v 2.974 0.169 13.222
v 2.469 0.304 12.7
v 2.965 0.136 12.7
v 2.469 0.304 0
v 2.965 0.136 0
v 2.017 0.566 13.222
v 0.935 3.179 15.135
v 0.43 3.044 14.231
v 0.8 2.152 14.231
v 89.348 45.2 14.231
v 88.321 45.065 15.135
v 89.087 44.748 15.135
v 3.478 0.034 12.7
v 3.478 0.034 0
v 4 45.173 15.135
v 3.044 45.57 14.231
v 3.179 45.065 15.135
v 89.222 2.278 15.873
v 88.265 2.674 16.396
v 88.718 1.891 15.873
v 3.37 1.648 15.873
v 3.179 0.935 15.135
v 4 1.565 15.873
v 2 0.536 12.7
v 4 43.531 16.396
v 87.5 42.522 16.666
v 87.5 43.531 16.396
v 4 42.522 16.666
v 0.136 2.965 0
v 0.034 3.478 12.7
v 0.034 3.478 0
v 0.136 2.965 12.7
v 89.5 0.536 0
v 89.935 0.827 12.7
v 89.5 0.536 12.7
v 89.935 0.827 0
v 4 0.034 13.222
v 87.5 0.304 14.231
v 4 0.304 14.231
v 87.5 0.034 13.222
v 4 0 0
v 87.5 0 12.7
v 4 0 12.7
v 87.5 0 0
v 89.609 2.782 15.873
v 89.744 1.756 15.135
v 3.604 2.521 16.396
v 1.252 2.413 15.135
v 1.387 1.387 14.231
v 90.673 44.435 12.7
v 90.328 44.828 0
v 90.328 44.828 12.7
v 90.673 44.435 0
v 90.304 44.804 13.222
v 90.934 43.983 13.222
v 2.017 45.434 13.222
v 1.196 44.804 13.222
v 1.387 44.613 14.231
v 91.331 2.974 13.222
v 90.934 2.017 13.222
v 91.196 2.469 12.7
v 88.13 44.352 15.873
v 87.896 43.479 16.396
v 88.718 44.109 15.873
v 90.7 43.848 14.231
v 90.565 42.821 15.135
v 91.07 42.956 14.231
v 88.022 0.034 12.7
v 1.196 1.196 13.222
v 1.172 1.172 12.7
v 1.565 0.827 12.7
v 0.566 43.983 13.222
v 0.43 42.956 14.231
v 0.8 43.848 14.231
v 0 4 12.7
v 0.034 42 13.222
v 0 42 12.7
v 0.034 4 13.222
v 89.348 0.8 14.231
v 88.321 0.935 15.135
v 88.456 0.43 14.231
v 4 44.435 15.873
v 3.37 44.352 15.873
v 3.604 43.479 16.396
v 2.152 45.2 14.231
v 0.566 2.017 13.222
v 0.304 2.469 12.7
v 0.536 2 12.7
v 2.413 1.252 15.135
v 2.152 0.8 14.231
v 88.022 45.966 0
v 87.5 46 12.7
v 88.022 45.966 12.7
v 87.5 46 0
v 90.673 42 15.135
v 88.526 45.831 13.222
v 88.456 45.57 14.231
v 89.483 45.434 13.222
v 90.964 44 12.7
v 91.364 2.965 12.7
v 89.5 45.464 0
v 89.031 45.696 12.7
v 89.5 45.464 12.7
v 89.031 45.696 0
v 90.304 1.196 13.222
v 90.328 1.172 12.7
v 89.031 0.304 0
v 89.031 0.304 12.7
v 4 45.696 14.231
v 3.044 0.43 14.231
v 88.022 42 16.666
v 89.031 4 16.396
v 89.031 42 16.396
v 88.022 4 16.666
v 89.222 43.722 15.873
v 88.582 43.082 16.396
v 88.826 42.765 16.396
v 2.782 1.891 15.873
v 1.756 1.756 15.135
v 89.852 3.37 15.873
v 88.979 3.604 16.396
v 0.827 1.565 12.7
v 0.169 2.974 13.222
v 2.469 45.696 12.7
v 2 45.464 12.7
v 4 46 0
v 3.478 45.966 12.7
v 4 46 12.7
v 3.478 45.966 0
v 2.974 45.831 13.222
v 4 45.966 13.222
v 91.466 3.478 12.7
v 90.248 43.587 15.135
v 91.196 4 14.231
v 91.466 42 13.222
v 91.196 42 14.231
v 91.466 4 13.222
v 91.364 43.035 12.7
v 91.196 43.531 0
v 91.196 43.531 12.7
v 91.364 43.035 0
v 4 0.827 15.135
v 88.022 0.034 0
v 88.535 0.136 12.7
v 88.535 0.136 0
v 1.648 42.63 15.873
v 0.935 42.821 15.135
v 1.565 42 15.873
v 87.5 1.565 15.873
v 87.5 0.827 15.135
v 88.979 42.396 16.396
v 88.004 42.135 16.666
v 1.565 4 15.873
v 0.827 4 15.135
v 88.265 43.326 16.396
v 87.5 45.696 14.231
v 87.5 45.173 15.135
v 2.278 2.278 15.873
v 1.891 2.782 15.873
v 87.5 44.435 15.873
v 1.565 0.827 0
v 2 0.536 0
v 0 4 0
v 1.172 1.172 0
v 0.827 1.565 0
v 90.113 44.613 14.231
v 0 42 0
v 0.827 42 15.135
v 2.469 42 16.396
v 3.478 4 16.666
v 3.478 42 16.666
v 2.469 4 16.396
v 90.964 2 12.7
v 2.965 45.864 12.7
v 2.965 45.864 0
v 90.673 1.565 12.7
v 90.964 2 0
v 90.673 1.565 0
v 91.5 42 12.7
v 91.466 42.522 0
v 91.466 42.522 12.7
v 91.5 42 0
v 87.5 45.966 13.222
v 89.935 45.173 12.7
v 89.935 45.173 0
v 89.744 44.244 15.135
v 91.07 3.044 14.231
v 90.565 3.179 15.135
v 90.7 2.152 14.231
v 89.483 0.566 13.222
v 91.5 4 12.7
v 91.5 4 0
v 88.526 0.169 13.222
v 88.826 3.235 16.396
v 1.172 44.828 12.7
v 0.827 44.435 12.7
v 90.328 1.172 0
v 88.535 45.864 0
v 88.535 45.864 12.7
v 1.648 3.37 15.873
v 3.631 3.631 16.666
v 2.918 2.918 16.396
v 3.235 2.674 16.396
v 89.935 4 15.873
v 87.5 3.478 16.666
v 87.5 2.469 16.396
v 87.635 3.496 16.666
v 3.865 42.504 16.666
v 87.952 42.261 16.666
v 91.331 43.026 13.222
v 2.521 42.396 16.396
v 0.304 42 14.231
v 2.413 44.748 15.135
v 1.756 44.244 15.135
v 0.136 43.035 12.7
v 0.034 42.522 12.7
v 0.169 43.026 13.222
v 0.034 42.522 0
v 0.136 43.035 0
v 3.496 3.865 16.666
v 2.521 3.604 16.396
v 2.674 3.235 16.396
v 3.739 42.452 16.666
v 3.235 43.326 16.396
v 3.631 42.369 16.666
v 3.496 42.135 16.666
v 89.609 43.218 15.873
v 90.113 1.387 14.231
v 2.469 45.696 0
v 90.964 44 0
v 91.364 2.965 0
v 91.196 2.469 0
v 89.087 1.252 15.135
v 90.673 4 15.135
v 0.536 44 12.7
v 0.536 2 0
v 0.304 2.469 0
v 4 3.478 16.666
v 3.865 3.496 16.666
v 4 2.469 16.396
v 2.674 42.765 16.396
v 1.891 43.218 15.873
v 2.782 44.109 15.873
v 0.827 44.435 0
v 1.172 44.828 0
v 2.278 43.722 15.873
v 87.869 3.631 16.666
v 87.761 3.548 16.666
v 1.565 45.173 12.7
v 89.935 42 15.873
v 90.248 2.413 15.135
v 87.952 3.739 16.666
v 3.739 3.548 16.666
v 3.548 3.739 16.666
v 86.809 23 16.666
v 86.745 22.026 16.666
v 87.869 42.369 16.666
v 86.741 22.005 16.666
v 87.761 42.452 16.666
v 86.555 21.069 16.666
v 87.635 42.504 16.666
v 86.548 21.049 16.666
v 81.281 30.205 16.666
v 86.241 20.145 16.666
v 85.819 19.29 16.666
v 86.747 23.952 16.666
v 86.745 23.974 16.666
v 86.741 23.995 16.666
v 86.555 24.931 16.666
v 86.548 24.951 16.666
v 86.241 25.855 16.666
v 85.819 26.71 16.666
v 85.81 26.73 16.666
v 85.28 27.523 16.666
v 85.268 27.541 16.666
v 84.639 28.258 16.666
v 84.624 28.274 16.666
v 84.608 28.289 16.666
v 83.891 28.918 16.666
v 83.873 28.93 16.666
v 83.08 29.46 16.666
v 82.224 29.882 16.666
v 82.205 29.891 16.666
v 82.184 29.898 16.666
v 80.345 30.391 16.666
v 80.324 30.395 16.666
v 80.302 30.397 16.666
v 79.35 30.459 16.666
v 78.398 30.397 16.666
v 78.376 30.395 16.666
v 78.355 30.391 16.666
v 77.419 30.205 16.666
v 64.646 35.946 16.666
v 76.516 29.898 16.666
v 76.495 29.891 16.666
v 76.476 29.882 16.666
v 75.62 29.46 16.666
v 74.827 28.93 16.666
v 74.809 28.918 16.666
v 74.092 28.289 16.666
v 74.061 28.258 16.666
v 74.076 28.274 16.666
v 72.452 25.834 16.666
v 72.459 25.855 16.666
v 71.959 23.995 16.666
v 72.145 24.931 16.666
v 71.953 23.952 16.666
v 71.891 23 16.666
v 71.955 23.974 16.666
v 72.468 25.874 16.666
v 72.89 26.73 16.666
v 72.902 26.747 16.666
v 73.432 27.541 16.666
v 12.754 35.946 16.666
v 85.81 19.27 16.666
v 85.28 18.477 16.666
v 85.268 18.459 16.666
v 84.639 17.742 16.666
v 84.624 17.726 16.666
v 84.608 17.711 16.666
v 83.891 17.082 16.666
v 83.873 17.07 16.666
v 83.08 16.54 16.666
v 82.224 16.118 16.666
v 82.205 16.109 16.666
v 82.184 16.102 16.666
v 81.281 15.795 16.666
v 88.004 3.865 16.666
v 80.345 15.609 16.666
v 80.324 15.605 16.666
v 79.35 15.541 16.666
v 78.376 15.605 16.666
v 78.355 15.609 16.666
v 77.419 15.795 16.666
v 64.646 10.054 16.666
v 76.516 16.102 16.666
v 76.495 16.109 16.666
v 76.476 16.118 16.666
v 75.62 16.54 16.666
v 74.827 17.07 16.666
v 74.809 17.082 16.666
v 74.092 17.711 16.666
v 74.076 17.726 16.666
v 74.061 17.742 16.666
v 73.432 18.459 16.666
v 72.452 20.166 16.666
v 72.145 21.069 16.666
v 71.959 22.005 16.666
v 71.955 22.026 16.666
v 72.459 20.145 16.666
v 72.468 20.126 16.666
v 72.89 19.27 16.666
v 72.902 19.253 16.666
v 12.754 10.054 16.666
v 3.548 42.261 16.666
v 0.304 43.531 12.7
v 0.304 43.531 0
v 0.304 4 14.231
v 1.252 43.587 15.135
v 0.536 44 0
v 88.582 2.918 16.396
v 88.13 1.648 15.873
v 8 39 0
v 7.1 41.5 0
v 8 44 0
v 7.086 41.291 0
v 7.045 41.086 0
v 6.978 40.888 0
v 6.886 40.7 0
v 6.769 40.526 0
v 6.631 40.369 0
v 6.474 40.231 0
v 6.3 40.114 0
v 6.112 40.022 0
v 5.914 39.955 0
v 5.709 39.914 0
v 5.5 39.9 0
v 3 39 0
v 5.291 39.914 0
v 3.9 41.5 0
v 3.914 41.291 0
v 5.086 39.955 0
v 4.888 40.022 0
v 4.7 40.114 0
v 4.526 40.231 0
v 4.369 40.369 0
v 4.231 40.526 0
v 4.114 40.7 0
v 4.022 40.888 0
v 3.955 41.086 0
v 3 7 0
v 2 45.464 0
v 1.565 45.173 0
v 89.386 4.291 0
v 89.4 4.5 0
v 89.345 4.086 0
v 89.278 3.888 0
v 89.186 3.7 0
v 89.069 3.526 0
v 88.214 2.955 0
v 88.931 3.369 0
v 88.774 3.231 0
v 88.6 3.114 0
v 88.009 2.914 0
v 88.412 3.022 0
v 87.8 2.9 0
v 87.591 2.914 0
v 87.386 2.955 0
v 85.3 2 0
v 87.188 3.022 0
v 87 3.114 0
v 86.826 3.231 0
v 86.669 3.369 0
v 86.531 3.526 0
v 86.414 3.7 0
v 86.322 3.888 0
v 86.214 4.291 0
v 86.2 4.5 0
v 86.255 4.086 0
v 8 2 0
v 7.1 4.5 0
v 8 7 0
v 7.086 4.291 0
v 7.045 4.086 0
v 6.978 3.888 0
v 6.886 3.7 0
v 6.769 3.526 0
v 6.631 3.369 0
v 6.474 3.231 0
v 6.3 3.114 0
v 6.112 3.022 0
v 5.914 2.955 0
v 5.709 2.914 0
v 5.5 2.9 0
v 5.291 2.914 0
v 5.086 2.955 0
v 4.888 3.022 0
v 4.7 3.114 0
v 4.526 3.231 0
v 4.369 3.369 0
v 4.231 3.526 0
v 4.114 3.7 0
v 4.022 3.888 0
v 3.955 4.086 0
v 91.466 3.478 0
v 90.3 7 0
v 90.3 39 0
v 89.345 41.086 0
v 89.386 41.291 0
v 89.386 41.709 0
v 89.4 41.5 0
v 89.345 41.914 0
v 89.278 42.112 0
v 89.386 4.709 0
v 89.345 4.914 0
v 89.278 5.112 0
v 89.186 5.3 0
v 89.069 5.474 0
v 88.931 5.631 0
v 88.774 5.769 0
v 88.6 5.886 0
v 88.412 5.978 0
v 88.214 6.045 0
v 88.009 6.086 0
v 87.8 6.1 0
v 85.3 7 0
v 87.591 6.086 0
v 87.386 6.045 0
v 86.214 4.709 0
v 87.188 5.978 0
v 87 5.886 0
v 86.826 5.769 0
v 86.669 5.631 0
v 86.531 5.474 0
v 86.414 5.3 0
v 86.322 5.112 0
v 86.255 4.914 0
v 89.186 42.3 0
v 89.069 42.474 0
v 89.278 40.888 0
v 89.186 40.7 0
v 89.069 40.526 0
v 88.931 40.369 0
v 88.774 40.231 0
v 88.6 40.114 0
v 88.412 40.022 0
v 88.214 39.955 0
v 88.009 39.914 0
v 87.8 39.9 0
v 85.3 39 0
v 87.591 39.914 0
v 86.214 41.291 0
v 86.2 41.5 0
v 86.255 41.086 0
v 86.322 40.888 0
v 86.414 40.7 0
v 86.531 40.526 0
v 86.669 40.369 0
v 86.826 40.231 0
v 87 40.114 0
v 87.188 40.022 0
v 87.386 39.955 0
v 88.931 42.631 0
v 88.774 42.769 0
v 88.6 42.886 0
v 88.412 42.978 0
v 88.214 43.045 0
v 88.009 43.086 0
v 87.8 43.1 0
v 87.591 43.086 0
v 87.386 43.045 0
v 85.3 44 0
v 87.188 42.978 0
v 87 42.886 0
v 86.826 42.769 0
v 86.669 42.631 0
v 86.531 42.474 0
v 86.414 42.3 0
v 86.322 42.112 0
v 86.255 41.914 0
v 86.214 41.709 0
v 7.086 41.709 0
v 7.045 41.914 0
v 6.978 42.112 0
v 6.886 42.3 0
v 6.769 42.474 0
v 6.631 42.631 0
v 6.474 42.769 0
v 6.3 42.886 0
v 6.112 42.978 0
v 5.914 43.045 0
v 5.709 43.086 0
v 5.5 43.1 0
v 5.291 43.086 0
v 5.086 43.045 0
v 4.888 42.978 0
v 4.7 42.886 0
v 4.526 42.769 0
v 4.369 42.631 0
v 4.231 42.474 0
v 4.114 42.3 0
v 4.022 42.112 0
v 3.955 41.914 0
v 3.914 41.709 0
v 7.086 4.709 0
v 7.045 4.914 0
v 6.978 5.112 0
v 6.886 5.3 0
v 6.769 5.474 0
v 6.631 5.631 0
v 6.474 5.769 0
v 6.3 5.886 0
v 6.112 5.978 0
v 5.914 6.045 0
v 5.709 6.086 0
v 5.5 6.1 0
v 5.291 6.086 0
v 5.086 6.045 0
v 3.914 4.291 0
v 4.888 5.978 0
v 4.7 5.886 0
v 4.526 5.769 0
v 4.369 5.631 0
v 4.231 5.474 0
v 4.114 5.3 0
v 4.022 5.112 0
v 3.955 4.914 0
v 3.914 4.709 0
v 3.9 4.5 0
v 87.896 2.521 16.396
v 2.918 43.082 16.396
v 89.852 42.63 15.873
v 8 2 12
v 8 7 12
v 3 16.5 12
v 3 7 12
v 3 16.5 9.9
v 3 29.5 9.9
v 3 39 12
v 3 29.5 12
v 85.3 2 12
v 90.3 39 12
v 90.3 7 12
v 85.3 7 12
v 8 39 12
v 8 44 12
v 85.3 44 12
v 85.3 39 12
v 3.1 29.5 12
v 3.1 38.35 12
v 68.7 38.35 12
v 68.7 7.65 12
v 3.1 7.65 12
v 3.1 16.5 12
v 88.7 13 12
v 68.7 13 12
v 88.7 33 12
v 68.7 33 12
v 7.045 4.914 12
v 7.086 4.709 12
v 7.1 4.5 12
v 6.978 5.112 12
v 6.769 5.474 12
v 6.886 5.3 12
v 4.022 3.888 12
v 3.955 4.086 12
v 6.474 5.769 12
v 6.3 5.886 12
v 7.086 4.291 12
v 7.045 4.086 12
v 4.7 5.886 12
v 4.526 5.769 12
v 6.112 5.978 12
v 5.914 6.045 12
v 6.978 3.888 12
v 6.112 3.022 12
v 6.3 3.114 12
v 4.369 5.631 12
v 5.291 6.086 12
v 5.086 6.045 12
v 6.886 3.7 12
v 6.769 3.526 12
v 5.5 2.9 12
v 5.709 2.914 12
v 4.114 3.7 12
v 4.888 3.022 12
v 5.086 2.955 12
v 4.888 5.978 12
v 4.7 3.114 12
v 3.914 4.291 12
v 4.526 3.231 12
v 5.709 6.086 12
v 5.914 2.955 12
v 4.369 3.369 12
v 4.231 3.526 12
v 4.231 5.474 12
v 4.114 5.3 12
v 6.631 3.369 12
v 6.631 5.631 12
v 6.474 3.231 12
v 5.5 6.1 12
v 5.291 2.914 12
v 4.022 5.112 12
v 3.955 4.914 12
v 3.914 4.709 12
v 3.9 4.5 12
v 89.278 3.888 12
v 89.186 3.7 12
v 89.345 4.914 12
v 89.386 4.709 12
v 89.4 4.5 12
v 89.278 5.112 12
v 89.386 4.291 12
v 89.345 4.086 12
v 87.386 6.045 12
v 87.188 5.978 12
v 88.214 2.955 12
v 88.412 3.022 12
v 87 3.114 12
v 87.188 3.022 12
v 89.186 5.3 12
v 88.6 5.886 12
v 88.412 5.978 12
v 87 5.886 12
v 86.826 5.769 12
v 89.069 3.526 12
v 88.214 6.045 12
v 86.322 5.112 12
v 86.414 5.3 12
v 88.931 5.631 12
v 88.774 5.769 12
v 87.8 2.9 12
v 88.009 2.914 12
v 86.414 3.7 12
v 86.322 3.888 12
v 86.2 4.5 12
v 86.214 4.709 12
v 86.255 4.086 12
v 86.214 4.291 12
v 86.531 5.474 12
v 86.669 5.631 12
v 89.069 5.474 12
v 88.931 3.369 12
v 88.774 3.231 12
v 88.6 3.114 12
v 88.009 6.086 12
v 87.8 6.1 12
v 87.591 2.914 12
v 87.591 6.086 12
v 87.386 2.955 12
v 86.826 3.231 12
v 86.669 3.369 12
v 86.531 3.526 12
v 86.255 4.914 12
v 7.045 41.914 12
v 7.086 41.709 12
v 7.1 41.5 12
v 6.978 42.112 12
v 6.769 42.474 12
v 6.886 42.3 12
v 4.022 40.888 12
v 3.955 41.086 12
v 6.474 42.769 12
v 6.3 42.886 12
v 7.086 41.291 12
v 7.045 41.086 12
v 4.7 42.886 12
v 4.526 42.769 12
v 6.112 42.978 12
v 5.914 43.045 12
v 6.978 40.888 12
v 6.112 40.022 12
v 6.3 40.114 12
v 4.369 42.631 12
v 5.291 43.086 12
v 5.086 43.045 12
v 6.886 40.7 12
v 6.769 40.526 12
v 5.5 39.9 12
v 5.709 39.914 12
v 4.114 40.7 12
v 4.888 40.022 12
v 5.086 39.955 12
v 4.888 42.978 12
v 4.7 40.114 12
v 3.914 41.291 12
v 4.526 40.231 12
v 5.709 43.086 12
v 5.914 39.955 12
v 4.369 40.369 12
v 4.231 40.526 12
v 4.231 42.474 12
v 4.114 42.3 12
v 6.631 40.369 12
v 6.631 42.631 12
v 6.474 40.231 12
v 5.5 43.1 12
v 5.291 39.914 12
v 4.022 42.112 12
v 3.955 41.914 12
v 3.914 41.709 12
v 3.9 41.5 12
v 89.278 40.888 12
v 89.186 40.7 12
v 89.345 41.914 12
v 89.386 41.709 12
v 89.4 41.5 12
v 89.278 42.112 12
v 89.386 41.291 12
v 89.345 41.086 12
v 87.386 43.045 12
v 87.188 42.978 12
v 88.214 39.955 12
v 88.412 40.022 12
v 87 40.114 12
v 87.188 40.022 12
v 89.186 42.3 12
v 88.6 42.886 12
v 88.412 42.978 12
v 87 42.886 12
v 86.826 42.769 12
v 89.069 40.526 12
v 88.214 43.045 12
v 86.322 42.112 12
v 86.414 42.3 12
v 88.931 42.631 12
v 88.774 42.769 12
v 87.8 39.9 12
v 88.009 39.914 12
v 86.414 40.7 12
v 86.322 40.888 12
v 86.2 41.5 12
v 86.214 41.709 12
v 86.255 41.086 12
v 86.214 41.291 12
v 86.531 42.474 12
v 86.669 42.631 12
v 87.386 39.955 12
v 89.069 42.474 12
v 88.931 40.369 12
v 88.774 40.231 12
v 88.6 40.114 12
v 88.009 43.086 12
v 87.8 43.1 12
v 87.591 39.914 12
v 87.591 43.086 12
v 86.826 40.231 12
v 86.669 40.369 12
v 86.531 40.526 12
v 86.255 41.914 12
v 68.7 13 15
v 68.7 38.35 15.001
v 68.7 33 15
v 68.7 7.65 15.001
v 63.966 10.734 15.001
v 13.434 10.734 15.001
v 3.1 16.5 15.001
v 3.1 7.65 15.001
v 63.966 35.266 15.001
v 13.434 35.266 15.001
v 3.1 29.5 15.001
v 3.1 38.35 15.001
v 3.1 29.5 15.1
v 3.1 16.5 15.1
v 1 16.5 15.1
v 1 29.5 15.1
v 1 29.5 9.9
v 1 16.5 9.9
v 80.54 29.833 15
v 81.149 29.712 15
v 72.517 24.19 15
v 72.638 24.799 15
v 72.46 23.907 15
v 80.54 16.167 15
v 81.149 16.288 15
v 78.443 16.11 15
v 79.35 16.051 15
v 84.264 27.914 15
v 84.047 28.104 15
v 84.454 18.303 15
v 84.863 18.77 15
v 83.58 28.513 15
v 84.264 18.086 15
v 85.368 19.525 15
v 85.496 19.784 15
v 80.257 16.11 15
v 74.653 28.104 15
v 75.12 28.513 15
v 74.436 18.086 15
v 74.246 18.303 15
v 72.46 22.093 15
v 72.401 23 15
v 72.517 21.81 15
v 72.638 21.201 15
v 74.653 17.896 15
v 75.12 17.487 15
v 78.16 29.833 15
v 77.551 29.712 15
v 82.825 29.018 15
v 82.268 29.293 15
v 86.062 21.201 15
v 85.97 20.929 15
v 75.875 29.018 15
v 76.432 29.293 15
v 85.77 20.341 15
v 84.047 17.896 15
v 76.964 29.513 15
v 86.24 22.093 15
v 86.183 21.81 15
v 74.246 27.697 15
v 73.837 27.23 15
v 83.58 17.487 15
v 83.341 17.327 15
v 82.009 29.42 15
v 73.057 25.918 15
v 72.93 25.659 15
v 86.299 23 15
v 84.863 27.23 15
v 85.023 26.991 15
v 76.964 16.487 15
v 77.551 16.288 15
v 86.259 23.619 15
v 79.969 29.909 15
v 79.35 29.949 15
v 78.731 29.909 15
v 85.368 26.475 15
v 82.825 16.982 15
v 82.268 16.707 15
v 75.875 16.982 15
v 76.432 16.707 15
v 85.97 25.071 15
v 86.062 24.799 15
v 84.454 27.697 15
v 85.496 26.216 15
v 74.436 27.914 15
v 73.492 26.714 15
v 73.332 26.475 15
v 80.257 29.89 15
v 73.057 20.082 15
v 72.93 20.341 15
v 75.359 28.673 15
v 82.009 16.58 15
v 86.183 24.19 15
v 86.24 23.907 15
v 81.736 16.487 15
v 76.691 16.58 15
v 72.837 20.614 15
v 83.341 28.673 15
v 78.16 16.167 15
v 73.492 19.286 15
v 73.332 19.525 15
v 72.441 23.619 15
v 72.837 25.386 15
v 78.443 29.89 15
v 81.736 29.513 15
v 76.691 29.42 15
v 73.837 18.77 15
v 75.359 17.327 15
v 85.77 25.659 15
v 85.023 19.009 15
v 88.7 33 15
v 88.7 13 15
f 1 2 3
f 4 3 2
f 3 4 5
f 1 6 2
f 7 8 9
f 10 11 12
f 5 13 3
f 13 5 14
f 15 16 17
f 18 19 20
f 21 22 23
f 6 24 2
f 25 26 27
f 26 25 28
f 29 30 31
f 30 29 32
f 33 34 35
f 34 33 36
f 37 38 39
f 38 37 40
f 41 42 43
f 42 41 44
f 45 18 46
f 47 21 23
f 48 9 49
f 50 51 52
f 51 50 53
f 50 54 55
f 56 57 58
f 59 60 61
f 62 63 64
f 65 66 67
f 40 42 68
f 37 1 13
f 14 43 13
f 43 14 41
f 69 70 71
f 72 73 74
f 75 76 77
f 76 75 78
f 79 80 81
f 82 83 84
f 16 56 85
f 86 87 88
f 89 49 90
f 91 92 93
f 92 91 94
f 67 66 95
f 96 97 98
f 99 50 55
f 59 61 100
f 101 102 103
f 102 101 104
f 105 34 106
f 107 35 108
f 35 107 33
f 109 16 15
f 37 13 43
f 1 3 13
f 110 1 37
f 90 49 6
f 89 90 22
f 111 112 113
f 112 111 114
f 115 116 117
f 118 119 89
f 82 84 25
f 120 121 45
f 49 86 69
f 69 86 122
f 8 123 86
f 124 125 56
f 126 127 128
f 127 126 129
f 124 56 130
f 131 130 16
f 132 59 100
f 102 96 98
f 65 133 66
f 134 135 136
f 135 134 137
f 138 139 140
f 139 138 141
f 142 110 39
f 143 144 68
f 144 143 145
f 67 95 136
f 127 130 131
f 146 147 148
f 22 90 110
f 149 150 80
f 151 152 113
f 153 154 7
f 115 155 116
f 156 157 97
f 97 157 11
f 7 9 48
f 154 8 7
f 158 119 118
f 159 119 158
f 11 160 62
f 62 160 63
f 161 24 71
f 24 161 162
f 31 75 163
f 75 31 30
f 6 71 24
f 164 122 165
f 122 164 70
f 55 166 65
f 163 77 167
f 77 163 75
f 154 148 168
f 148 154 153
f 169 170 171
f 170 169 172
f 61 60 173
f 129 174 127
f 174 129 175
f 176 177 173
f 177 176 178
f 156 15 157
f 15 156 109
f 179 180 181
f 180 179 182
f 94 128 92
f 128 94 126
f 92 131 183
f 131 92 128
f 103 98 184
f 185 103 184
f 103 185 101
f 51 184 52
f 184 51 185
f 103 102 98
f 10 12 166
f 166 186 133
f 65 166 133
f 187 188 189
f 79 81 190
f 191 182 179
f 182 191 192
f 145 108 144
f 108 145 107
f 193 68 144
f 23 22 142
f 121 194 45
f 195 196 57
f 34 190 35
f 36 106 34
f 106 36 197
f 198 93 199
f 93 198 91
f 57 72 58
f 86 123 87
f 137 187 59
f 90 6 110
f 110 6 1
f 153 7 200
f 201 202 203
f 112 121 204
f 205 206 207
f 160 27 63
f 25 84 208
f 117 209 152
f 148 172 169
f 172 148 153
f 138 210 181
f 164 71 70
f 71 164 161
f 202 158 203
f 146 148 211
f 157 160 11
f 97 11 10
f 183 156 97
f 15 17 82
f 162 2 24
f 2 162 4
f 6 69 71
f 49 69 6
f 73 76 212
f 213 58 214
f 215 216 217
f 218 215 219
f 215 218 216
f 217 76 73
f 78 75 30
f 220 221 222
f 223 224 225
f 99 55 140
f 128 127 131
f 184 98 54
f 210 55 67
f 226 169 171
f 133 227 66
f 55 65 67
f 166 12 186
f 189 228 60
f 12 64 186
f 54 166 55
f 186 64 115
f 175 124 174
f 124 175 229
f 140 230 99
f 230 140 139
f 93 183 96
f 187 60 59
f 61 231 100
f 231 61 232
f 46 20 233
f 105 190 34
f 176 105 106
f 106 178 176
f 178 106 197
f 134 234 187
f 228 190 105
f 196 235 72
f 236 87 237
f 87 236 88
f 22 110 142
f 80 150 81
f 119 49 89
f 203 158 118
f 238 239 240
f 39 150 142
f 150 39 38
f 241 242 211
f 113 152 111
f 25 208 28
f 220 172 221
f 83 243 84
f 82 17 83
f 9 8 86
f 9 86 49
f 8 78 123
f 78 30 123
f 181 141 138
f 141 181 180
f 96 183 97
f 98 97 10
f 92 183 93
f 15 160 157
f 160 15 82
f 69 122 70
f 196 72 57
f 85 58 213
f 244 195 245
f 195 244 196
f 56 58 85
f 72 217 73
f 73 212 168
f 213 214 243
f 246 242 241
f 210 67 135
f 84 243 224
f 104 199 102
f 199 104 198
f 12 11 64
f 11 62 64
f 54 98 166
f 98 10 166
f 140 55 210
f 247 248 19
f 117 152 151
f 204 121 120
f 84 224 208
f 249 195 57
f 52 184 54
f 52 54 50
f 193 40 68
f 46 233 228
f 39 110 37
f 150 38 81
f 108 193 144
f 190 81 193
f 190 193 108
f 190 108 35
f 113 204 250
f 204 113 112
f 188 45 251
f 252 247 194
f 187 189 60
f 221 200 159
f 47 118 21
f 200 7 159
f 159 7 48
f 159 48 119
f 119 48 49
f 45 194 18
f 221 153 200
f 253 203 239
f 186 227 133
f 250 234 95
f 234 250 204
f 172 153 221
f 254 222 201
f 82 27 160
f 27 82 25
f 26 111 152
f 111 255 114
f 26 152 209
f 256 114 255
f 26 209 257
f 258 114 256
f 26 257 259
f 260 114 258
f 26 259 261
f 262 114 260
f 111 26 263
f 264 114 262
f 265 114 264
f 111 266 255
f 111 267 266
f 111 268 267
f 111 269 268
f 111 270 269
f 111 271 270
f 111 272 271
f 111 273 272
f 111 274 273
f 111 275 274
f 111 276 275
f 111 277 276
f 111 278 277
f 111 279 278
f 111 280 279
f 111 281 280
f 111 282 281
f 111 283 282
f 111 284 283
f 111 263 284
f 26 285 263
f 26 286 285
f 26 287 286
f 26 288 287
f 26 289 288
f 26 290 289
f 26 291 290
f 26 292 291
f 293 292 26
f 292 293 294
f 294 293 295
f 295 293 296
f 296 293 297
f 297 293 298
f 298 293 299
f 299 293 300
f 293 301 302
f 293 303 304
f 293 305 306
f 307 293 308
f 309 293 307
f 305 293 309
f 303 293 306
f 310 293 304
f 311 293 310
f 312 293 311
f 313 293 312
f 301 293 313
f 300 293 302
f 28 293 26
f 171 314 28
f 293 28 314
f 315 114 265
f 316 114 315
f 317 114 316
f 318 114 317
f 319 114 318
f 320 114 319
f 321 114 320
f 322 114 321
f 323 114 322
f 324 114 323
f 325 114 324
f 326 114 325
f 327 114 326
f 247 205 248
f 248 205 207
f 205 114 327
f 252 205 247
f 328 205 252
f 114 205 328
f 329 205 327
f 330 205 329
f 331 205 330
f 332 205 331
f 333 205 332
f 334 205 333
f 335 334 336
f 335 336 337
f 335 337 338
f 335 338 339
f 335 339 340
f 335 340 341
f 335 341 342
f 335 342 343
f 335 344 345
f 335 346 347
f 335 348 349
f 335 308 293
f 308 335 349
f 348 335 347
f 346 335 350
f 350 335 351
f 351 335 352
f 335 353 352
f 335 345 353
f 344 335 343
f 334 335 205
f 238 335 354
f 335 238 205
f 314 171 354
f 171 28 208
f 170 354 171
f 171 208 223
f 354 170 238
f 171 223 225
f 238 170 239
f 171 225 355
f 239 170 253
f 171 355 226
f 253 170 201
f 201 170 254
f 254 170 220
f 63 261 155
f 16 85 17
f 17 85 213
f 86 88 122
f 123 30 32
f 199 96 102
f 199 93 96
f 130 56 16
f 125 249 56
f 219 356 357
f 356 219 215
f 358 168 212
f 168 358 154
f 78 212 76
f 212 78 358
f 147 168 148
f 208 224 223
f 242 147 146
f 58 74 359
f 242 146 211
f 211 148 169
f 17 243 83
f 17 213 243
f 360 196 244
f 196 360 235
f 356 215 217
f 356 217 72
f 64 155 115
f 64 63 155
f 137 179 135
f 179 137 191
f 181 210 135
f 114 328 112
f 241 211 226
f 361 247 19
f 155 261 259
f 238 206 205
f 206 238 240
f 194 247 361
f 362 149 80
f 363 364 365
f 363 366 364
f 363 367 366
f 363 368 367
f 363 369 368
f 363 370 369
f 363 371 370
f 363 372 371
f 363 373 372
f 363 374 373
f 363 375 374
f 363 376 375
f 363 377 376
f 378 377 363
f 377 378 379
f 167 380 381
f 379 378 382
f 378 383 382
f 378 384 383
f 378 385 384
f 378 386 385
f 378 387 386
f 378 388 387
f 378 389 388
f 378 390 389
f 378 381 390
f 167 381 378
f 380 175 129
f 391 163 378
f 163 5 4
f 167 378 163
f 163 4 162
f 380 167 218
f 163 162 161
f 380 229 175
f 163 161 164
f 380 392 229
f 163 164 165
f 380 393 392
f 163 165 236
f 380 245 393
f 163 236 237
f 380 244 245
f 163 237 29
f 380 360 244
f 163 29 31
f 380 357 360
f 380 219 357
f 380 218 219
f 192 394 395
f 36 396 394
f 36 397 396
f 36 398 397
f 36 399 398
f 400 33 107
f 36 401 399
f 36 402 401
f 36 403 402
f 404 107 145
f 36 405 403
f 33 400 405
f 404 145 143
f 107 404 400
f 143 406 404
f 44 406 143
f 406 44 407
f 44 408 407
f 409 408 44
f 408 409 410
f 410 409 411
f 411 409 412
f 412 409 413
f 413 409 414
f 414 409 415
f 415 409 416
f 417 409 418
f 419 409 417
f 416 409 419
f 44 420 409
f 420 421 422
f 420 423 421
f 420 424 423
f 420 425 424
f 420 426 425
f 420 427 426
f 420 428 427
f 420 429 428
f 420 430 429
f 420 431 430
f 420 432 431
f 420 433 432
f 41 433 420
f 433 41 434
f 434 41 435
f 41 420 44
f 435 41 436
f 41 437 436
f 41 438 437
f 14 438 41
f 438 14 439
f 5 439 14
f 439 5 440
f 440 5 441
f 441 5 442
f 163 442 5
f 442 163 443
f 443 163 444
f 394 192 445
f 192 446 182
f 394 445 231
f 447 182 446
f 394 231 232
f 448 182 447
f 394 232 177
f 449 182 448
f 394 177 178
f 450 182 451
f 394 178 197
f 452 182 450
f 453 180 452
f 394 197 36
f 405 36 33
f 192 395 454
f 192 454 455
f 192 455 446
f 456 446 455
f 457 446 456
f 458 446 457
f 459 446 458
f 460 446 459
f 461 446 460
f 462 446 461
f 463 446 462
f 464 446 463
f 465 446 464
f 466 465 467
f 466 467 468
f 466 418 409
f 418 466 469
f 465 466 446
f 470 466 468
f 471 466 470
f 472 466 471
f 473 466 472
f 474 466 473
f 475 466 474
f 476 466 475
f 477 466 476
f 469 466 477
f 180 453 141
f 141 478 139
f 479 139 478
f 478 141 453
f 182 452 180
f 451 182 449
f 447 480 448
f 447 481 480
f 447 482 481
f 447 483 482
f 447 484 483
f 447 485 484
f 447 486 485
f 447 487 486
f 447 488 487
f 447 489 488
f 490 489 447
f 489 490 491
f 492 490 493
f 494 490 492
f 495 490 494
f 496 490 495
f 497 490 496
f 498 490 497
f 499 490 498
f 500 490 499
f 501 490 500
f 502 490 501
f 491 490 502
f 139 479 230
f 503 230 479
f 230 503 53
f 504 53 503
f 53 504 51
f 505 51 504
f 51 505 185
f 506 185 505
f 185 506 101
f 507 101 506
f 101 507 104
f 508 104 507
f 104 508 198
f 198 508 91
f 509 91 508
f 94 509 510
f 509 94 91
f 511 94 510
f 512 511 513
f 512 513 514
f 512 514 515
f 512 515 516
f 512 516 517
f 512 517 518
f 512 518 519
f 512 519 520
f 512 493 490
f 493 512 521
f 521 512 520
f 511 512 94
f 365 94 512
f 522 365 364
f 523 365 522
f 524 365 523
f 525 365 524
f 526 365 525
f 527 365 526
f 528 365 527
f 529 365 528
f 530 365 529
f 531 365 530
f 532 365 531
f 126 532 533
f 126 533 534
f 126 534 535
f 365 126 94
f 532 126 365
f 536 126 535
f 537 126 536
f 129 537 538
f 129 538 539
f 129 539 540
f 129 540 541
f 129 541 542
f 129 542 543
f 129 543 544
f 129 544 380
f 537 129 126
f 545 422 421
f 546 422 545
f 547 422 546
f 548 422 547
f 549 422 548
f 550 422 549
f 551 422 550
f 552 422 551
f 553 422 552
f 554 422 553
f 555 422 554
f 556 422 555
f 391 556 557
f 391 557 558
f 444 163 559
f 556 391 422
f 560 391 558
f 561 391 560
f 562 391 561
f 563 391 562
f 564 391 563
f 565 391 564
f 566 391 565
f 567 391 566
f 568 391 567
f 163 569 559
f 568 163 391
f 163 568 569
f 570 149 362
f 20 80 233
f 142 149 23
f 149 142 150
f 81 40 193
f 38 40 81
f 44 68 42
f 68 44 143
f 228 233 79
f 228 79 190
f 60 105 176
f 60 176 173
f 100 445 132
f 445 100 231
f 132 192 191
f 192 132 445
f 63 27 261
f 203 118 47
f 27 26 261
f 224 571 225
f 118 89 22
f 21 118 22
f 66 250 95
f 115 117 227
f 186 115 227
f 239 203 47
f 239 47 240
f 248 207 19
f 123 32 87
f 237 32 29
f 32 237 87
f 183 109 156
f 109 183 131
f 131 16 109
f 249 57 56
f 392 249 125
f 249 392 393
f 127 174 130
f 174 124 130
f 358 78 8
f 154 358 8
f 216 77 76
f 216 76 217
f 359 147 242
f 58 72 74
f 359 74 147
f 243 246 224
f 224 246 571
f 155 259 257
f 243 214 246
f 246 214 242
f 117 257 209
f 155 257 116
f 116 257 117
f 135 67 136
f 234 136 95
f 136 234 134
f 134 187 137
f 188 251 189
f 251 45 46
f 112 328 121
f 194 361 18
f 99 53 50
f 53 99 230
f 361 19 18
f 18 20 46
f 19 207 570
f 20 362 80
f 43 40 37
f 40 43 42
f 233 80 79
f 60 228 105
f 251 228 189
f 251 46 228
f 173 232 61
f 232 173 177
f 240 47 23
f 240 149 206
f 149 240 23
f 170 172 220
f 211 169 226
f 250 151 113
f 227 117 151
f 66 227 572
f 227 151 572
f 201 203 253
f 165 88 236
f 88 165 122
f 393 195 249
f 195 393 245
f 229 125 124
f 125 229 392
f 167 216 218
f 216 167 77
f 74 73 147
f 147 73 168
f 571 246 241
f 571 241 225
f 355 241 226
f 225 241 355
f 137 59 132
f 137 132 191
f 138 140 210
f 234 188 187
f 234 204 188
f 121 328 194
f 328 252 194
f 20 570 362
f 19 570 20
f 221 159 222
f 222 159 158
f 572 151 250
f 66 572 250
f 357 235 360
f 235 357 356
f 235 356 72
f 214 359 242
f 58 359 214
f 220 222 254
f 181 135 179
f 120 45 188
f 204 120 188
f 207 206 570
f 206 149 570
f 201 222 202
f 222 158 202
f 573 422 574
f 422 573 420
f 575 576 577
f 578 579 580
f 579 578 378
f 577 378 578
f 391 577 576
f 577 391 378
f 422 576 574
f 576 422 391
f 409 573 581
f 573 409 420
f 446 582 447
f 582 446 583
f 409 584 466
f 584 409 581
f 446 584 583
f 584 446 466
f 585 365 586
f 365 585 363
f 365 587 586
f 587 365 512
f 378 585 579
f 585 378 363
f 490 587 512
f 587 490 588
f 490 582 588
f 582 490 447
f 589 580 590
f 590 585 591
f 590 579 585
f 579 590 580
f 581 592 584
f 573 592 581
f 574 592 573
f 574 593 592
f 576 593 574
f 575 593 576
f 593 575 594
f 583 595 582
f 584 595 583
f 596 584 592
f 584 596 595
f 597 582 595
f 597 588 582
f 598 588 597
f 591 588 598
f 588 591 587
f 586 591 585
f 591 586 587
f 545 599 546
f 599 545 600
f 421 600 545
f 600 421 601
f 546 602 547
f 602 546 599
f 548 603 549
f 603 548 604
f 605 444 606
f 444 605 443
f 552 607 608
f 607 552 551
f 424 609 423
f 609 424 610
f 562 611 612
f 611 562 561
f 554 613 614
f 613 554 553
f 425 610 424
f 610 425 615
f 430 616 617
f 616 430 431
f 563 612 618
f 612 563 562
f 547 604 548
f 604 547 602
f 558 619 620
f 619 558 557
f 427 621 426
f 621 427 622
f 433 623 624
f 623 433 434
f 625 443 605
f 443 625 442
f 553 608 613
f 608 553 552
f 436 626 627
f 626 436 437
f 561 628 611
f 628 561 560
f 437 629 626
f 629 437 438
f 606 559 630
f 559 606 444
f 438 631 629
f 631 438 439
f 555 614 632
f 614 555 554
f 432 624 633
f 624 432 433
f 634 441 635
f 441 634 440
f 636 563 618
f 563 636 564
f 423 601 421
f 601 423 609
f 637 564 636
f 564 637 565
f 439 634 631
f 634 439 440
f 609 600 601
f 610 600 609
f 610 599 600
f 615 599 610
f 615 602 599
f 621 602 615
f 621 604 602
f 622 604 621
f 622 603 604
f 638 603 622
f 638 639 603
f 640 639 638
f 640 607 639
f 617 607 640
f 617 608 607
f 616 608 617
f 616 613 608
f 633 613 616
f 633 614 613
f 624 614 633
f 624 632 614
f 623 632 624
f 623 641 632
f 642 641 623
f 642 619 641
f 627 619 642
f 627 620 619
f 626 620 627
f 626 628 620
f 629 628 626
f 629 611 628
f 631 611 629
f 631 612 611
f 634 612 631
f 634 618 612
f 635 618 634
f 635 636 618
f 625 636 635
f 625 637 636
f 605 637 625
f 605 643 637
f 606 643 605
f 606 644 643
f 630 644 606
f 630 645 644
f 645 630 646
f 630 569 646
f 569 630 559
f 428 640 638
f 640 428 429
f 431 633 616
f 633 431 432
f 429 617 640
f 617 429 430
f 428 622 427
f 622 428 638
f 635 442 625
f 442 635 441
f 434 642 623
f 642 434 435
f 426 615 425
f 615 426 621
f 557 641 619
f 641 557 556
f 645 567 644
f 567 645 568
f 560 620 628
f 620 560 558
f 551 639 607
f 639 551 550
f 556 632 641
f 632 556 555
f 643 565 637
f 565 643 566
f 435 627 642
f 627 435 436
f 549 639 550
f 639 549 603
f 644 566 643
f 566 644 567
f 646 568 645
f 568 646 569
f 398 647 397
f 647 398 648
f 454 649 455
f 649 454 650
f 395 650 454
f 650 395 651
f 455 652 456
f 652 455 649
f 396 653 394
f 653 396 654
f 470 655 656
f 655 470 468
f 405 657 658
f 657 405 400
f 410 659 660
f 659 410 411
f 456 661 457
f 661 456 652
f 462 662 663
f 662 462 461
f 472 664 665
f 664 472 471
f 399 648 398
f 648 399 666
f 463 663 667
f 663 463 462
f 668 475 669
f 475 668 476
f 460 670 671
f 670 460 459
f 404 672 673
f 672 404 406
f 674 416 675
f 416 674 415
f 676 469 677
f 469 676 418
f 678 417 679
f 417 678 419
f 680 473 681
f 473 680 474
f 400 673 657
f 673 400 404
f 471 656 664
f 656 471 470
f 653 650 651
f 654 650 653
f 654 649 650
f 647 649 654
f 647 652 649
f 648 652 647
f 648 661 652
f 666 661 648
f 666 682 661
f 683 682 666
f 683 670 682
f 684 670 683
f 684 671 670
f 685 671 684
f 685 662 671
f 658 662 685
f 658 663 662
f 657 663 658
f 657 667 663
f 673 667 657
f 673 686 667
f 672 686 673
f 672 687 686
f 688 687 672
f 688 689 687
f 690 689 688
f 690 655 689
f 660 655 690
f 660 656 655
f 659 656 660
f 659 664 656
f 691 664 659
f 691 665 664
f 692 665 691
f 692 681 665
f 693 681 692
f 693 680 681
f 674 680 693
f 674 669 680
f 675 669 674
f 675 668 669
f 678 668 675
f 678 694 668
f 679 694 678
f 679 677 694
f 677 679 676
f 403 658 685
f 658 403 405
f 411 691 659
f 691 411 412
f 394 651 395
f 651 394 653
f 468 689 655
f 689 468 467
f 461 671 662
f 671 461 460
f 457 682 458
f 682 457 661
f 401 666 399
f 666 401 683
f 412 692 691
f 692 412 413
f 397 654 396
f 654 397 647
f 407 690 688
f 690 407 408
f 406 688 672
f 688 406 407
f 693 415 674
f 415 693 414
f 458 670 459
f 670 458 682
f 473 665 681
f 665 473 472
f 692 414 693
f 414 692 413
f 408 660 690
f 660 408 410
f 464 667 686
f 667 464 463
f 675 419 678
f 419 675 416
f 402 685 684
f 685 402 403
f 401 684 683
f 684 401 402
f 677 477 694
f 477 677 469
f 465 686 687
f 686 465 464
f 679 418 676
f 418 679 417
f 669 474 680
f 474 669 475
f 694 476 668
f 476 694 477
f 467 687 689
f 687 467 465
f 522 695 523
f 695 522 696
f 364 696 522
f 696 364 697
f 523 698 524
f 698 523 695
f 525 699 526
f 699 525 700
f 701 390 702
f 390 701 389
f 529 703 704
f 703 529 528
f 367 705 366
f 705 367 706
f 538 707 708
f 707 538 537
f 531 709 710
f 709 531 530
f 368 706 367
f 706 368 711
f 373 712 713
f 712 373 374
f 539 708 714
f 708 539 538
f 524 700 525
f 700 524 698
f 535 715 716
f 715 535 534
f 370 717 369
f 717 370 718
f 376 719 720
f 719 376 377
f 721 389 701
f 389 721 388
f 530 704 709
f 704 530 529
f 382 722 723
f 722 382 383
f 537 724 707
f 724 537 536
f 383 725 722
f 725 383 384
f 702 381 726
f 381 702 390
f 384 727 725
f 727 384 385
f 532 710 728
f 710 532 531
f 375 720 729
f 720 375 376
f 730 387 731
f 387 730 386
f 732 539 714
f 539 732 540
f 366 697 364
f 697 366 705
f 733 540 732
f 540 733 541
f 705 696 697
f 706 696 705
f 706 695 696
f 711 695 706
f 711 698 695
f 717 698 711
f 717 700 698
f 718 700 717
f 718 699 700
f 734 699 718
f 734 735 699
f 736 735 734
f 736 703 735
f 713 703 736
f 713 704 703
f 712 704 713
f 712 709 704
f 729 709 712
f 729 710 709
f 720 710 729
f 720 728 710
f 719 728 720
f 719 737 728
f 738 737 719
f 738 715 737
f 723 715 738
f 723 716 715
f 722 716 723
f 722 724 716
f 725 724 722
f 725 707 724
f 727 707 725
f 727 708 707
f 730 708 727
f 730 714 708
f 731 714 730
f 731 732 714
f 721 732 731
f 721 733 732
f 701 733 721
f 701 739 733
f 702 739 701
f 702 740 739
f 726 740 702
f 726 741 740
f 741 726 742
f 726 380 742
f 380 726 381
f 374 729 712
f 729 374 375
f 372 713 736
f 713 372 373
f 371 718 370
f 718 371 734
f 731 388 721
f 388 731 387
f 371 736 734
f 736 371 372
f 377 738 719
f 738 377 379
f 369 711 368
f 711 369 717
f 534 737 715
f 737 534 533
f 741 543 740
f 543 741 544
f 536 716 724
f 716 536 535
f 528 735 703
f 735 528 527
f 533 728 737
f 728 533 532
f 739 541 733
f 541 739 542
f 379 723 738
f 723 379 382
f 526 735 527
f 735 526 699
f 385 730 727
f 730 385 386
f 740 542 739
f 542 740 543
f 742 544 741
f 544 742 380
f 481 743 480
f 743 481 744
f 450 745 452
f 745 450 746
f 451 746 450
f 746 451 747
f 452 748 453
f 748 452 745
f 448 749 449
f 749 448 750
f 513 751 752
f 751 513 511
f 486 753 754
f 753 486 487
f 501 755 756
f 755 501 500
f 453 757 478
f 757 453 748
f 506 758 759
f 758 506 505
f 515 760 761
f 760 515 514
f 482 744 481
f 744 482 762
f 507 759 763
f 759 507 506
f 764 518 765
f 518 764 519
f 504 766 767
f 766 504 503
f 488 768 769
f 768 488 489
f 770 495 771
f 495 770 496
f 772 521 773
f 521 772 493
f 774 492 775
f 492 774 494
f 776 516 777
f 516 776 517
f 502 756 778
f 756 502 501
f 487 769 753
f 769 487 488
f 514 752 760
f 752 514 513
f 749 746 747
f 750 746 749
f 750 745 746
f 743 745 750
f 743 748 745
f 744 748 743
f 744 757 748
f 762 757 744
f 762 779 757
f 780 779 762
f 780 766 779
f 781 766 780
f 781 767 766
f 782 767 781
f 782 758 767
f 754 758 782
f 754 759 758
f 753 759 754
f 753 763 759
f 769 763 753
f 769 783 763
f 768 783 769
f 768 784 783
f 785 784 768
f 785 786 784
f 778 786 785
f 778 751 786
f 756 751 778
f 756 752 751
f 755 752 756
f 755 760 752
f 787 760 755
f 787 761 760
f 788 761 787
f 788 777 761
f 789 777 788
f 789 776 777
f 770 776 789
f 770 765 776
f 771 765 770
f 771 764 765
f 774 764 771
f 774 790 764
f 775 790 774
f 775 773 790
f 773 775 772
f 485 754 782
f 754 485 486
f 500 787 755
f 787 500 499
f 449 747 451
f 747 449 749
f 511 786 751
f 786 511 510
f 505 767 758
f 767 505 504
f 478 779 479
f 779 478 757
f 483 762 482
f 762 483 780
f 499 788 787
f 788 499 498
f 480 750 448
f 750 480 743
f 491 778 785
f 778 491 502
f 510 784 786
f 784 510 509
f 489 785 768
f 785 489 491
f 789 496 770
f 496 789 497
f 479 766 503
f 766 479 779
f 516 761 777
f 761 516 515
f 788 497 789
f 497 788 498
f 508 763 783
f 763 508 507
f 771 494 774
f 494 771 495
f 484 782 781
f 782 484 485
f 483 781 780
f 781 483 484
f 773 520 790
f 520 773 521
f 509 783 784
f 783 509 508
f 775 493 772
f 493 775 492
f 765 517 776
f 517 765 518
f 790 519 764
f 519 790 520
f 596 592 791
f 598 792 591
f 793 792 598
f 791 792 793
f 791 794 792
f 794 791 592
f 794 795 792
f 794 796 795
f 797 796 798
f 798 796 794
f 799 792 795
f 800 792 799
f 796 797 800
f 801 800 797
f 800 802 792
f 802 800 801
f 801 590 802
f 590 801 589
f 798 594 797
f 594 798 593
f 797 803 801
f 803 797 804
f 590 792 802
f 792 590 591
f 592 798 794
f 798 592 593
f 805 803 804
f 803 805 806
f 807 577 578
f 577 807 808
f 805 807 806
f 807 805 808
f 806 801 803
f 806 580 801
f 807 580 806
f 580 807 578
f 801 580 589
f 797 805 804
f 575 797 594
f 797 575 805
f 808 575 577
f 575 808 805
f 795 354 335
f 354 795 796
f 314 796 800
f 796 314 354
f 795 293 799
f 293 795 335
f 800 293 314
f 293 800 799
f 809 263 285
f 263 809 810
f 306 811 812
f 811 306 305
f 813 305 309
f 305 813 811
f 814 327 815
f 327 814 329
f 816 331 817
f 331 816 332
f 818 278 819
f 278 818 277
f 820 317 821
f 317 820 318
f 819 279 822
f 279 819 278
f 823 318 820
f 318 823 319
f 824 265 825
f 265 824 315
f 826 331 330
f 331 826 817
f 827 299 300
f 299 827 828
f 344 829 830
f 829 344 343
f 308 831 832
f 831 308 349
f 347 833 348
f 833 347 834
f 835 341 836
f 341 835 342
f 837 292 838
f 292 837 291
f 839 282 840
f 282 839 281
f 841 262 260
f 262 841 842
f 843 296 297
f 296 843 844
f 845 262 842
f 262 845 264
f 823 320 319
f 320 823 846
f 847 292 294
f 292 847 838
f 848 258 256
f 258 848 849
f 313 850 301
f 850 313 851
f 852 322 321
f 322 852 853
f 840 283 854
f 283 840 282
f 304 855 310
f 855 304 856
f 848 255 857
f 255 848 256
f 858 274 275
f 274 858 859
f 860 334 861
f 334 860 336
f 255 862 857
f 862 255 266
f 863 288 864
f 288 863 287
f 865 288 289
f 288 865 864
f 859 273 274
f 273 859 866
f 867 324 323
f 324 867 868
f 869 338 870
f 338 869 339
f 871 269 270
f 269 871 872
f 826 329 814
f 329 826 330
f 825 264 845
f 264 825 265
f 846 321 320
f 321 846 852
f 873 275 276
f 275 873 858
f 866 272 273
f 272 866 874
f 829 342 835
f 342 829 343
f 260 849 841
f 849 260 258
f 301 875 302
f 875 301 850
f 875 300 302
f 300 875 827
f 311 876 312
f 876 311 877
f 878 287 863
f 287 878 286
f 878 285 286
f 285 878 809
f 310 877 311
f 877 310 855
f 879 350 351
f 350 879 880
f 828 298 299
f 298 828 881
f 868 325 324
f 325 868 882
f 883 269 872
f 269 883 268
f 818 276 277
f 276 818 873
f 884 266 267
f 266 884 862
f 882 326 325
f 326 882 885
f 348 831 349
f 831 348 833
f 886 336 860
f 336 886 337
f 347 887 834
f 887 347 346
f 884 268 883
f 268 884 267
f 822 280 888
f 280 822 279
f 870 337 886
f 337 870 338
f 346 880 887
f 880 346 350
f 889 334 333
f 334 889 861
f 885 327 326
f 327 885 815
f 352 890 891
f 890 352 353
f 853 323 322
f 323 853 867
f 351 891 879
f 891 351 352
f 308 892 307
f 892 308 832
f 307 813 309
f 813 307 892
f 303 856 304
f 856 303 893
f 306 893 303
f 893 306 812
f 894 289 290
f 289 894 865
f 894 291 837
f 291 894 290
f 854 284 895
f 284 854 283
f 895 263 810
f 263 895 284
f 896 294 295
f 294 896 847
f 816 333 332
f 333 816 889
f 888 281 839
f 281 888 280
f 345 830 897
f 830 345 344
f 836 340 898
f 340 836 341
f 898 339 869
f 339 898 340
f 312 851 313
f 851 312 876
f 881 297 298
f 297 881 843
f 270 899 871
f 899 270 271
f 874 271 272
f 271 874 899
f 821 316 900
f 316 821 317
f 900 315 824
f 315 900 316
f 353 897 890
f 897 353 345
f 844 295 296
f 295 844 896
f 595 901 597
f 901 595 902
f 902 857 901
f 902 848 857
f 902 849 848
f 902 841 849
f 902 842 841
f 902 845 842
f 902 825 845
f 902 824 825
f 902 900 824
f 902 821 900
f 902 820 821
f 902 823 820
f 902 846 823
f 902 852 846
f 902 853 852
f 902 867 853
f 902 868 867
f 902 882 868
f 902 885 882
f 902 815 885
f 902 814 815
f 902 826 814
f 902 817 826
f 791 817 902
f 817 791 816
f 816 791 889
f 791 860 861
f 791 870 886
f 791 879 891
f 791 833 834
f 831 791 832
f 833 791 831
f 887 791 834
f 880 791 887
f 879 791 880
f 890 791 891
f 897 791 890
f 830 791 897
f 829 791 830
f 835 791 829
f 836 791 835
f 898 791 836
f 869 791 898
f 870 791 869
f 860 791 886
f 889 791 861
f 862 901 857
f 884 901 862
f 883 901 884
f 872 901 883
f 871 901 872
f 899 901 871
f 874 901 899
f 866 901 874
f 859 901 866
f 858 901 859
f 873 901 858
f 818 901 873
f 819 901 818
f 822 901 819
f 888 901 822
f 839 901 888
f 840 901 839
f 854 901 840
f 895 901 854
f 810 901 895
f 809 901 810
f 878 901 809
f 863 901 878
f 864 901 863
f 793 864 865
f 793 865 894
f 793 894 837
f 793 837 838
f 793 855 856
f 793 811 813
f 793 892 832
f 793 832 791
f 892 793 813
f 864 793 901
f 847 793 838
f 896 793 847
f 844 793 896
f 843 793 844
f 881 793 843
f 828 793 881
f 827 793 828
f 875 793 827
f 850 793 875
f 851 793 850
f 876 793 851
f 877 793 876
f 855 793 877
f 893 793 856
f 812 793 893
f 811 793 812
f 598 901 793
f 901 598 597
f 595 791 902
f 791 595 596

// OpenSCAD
// Dilder Rev 2 "extended with joystick" — TOP COVER (windowed, screen inlay,
// 2 mm divet) v2 — Y=46 variant
//
// Forked from top-cover-windowed-screen-inlay-pico2-v2-2mm.scad (the latest
// iteration with 0.7 mm face plate, no joystick-PCB mount bores, and the
// -1 mm/edge shrunken viewing window). Only difference from that file:
// outer Y bumped 44 → 46 mm to mate with base-v2-thin-dual-10440 (which
// grew Y by 2 mm to fit two 10440 cells flanking the Pico W).
//
// All the Y-dependent features (display centerline, screen inlay, viewing
// window, joystick hole, pillar positions) auto-recenter to the new wider
// Y via the existing derivation formulas.
//
// Export:
//   openscad -o top-cover-windowed-screen-inlay-v2-46y.3mf top-cover-windowed-screen-inlay-v2-46y.scad

$fn = 48;

// ============================================================
// Outer shell (flush with base-v2 and middle-platform-v2-46y)
// ============================================================
enclosure_outer_width_along_x_axis_mm          = 91.5;
enclosure_outer_depth_along_y_axis_mm          = 46;   // was 44; matches base-v2
outer_case_top_view_corner_radius_mm           = 4;
outer_case_top_edge_bullnose_radius_mm         = 4;

// ============================================================
// Asymmetric ±X end walls — match base-v2 so pillar origins align
// ============================================================
minus_x_end_wall_thickness_mm                  = 3.0;
plus_x_end_wall_thickness_mm                   = 1.2;
perimeter_long_side_wall_thickness_y_mm_base   = 2;

// ============================================================
// Cover Z layout (unchanged from v1/pico2 family)
// ============================================================
middle_platform_pedestal_protrusion_into_cover_z_mm = 5;

display_footprint_thickness_z_mm               = 7;
// 0.7 mm face plate (from v1-2mm learnings — 0.5 was too thin and showed
// a hairline seam along the inlay top edge on the first print).
face_plate_thickness_z_mm                      = 0.7;

display_bottom_z_mm =
    middle_platform_pedestal_protrusion_into_cover_z_mm;
display_top_z_mm =
    display_bottom_z_mm + display_footprint_thickness_z_mm;
face_plate_bottom_z_mm                         = display_top_z_mm;
face_plate_top_z_mm =
    face_plate_bottom_z_mm + face_plate_thickness_z_mm;
cover_total_height_z_mm =
    face_plate_top_z_mm + outer_case_top_edge_bullnose_radius_mm;

// ============================================================
// Display footprint — Waveshare 2.13", landscape, Pico 2 Y-slop
// ============================================================
display_footprint_length_along_x_mm            = 65;
display_footprint_depth_along_y_mm             = 30;
print_fit_tolerance_slop_mm                    = 0.4;

display_minus_x_origin_mm =
    minus_x_end_wall_thickness_mm
      + print_fit_tolerance_slop_mm;
display_plus_x_end_mm =
    display_minus_x_origin_mm + display_footprint_length_along_x_mm;
display_y_centerline_mm =
    enclosure_outer_depth_along_y_axis_mm / 2;                     // = 23 (was 22)
display_minus_y_origin_mm =
    display_y_centerline_mm - display_footprint_depth_along_y_mm / 2;
display_plus_y_end_mm =
    display_minus_y_origin_mm + display_footprint_depth_along_y_mm;

// ============================================================
// Screen inlay recess (0.3 X, 0.35 Y per-edge slop — from pico2-v2)
// ============================================================
screen_inlay_depth_z_mm                        = 3;
screen_inlay_xy_slop_per_edge_mm               = 0.3;  // X slop
screen_inlay_y_slop_per_edge_mm                = 0.35; // Y slop (+0.05 mm more for Pico 2 screen fit)

screen_inlay_x_start_mm =
    display_minus_x_origin_mm - screen_inlay_xy_slop_per_edge_mm;
screen_inlay_x_end_mm =
    display_plus_x_end_mm + screen_inlay_xy_slop_per_edge_mm;
screen_inlay_y_start_mm =
    display_minus_y_origin_mm - screen_inlay_y_slop_per_edge_mm;
screen_inlay_y_end_mm =
    display_plus_y_end_mm + screen_inlay_y_slop_per_edge_mm;
screen_inlay_bottom_z_mm = face_plate_bottom_z_mm;
screen_inlay_top_z_mm =
    face_plate_bottom_z_mm + screen_inlay_depth_z_mm;

// ============================================================
// FPC ribbon divet (2 mm variant, unchanged)
// ============================================================
fpc_ribbon_divet_width_along_y_mm              = 13;
fpc_ribbon_divet_wall_remaining_thickness_mm   = 1.0;
fpc_ribbon_divet_z_extend_below_inlay_mm       = 2.0;
fpc_ribbon_divet_x_start_mm =
    fpc_ribbon_divet_wall_remaining_thickness_mm;
fpc_ribbon_divet_x_end_mm =
    screen_inlay_x_start_mm;
fpc_ribbon_divet_y_start_mm =
    display_y_centerline_mm - fpc_ribbon_divet_width_along_y_mm / 2;
fpc_ribbon_divet_y_end_mm =
    fpc_ribbon_divet_y_start_mm + fpc_ribbon_divet_width_along_y_mm;
fpc_ribbon_divet_z_bottom_mm =
    screen_inlay_bottom_z_mm - fpc_ribbon_divet_z_extend_below_inlay_mm;
fpc_ribbon_divet_z_top_mm =
    screen_inlay_top_z_mm;

// ============================================================
// Display viewing window (48 × 22, shift 2.8 — from pico2-v2 latest)
// ============================================================
display_viewing_window_length_along_x_mm       = 48;
display_viewing_window_depth_along_y_mm        = 22;
display_window_shift_toward_joystick_x_mm      = 2.8;
display_window_origin_x_mm =
    display_minus_x_origin_mm
      + (display_footprint_length_along_x_mm
          - display_viewing_window_length_along_x_mm) / 2
      + display_window_shift_toward_joystick_x_mm;
display_window_origin_y_mm =
    display_minus_y_origin_mm
      + (display_footprint_depth_along_y_mm
          - display_viewing_window_depth_along_y_mm) / 2;
display_window_top_taper_width_mm              = 2.0;

// ============================================================
// Joystick through-hole (+X half, centered on display Y centerline)
// ============================================================
joystick_through_hole_diameter_mm              = 12;
joystick_through_hole_center_x_mm =
    (display_plus_x_end_mm
      + (enclosure_outer_width_along_x_axis_mm
          - plus_x_end_wall_thickness_mm)) / 2;
joystick_through_hole_center_y_mm              = display_y_centerline_mm;
joystick_hole_top_taper_width_mm               = 1.5;

// ============================================================
// Joystick PCB pocket (mount bores kept removed — see NOTE below)
// ============================================================
joystick_pcb_pocket_width_x_mm                 = 20;
joystick_pcb_pocket_depth_y_mm                 = 20;
joystick_pcb_pocket_depth_z_mm                 = screen_inlay_depth_z_mm;
joystick_pcb_mount_bore_diameter_mm            = 3.2;
joystick_pcb_mount_bore_depth_z_mm             = 1.2;
joystick_pcb_mount_screw_inset_from_corner_mm  = 2.5;

joystick_pcb_pocket_x_start_mm =
    screen_inlay_x_end_mm;
joystick_pcb_pocket_x_end_mm =
    joystick_pcb_pocket_x_start_mm + joystick_pcb_pocket_width_x_mm;
joystick_pcb_pocket_y_start_mm =
    joystick_through_hole_center_y_mm - joystick_pcb_pocket_depth_y_mm / 2;
joystick_pcb_pocket_y_end_mm =
    joystick_pcb_pocket_y_start_mm + joystick_pcb_pocket_depth_y_mm;
joystick_pcb_pocket_ceiling_z_mm =
    face_plate_bottom_z_mm + joystick_pcb_pocket_depth_z_mm;

joystick_pcb_mount_bore_xy_positions_list = [
    [joystick_pcb_pocket_x_start_mm + joystick_pcb_mount_screw_inset_from_corner_mm,
     joystick_pcb_pocket_y_start_mm + joystick_pcb_mount_screw_inset_from_corner_mm],
    [joystick_pcb_pocket_x_end_mm   - joystick_pcb_mount_screw_inset_from_corner_mm,
     joystick_pcb_pocket_y_start_mm + joystick_pcb_mount_screw_inset_from_corner_mm],
    [joystick_pcb_pocket_x_start_mm + joystick_pcb_mount_screw_inset_from_corner_mm,
     joystick_pcb_pocket_y_end_mm   - joystick_pcb_mount_screw_inset_from_corner_mm],
    [joystick_pcb_pocket_x_end_mm   - joystick_pcb_mount_screw_inset_from_corner_mm,
     joystick_pcb_pocket_y_end_mm   - joystick_pcb_mount_screw_inset_from_corner_mm],
];

// ============================================================
// Corner pillars — blind M3 bores, aligned with base-v2
// ============================================================
corner_pillar_square_side_length_mm            = 5;
corner_pillar_inner_facing_corner_radius_mm    = 1;
m3_screw_clearance_hole_diameter_mm            = 3.2;
m3_bore_top_z_mm                               = face_plate_bottom_z_mm;

corner_pillar_xy_origin_positions_list = [
    [minus_x_end_wall_thickness_mm,
     perimeter_long_side_wall_thickness_y_mm_base],
    [enclosure_outer_width_along_x_axis_mm
       - plus_x_end_wall_thickness_mm
       - corner_pillar_square_side_length_mm,
     perimeter_long_side_wall_thickness_y_mm_base],
    [minus_x_end_wall_thickness_mm,
     enclosure_outer_depth_along_y_axis_mm
       - perimeter_long_side_wall_thickness_y_mm_base
       - corner_pillar_square_side_length_mm],
    [enclosure_outer_width_along_x_axis_mm
       - plus_x_end_wall_thickness_mm
       - corner_pillar_square_side_length_mm,
     enclosure_outer_depth_along_y_axis_mm
       - perimeter_long_side_wall_thickness_y_mm_base
       - corner_pillar_square_side_length_mm],
];


// ========== Helpers ==========

module pillar_one_round(w, l, h, r, round_x, round_y) {
    tiny = 0.01;
    hull() {
        for (ix = [0, 1])
            for (iy = [0, 1]) {
                cr = (ix == round_x && iy == round_y) ? r : tiny;
                translate([cr + ix * (w - 2*cr), cr + iy * (l - 2*cr), 0])
                    cylinder(r = cr, h = h, $fn = 48);
            }
    }
}

module shell_with_bullnose_top(w, l, h, case_r, top_r) {
    intersection() {
        hull() {
            for (x = [case_r, w - case_r])
                for (y = [case_r, l - case_r]) {
                    translate([x, y, 0])
                        cylinder(r = case_r, h = h - top_r, $fn = 48);
                    translate([x, y, h - top_r])
                        sphere(r = case_r, $fn = 24);
                }
        }
        translate([-1, -1, 0])
            cube([w + 2, l + 2, h]);
    }
}

module chamber_carve_preserving_pillars(origin_x, origin_y, origin_z,
                                        width_x, depth_y, height_z,
                                        pillar_xy_list, pillar_side) {
    difference() {
        translate([origin_x, origin_y, origin_z])
            cube([width_x, depth_y, height_z]);
        for (pillar_origin_xy = pillar_xy_list)
            translate([pillar_origin_xy[0], pillar_origin_xy[1], origin_z - 0.5])
                cube([pillar_side, pillar_side, height_z + 1]);
    }
}


// ========== Top cover (windowed + screen inlay, Y=46) ==========

module top_cover_windowed_screen_inlay() {
    cavity_inner_x_start_mm = minus_x_end_wall_thickness_mm;
    cavity_inner_x_end_mm =
        enclosure_outer_width_along_x_axis_mm
          - plus_x_end_wall_thickness_mm;
    cavity_inner_y_start_mm = perimeter_long_side_wall_thickness_y_mm_base;
    cavity_inner_y_end_mm =
        enclosure_outer_depth_along_y_axis_mm
          - perimeter_long_side_wall_thickness_y_mm_base;

    difference() {
        union() {
            shell_with_bullnose_top(
                enclosure_outer_width_along_x_axis_mm,
                enclosure_outer_depth_along_y_axis_mm,
                cover_total_height_z_mm,
                outer_case_top_view_corner_radius_mm,
                outer_case_top_edge_bullnose_radius_mm);

            for (corner_pillar_origin_xy = corner_pillar_xy_origin_positions_list) {
                pillar_rounds_positive_x_corner =
                    (corner_pillar_origin_xy[0]
                      < enclosure_outer_width_along_x_axis_mm / 2) ? 1 : 0;
                pillar_rounds_positive_y_corner =
                    (corner_pillar_origin_xy[1]
                      < enclosure_outer_depth_along_y_axis_mm / 2) ? 1 : 0;
                translate([corner_pillar_origin_xy[0],
                           corner_pillar_origin_xy[1],
                           0])
                    pillar_one_round(
                        corner_pillar_square_side_length_mm,
                        corner_pillar_square_side_length_mm,
                        face_plate_top_z_mm,
                        corner_pillar_inner_facing_corner_radius_mm,
                        pillar_rounds_positive_x_corner,
                        pillar_rounds_positive_y_corner);
            }
        }

        chamber_carve_preserving_pillars(
            cavity_inner_x_start_mm,
            cavity_inner_y_start_mm,
            -0.1,
            cavity_inner_x_end_mm - cavity_inner_x_start_mm,
            cavity_inner_y_end_mm - cavity_inner_y_start_mm,
            face_plate_bottom_z_mm + 0.1,
            corner_pillar_xy_origin_positions_list,
            corner_pillar_square_side_length_mm);

        translate([screen_inlay_x_start_mm,
                   screen_inlay_y_start_mm,
                   screen_inlay_bottom_z_mm - 0.1])
            cube([screen_inlay_x_end_mm - screen_inlay_x_start_mm,
                  screen_inlay_y_end_mm - screen_inlay_y_start_mm,
                  (screen_inlay_top_z_mm + 0.001)
                    - (screen_inlay_bottom_z_mm - 0.1)]);

        translate([fpc_ribbon_divet_x_start_mm,
                   fpc_ribbon_divet_y_start_mm,
                   fpc_ribbon_divet_z_bottom_mm - 0.1])
            cube([fpc_ribbon_divet_x_end_mm - fpc_ribbon_divet_x_start_mm,
                  fpc_ribbon_divet_y_end_mm - fpc_ribbon_divet_y_start_mm,
                  (fpc_ribbon_divet_z_top_mm + 0.1)
                    - (fpc_ribbon_divet_z_bottom_mm - 0.1)]);

        hull() {
            translate([display_window_origin_x_mm,
                       display_window_origin_y_mm,
                       face_plate_bottom_z_mm - 0.1])
                cube([display_viewing_window_length_along_x_mm,
                      display_viewing_window_depth_along_y_mm,
                      0.001]);
            translate([display_window_origin_x_mm
                         - display_window_top_taper_width_mm,
                       display_window_origin_y_mm
                         - display_window_top_taper_width_mm,
                       cover_total_height_z_mm + 0.1 - 0.001])
                cube([display_viewing_window_length_along_x_mm
                        + 2 * display_window_top_taper_width_mm,
                      display_viewing_window_depth_along_y_mm
                        + 2 * display_window_top_taper_width_mm,
                      0.001]);
        }

        translate([joystick_through_hole_center_x_mm,
                   joystick_through_hole_center_y_mm,
                   0])
            hull() {
                translate([0, 0, face_plate_bottom_z_mm - 0.1])
                    cylinder(
                        h = 0.001,
                        d = joystick_through_hole_diameter_mm);
                translate([0, 0,
                           cover_total_height_z_mm + 0.1 - 0.001])
                    cylinder(
                        h = 0.001,
                        d = joystick_through_hole_diameter_mm
                              + 2 * joystick_hole_top_taper_width_mm);
            }

        for (corner_pillar_origin_xy = corner_pillar_xy_origin_positions_list) {
            screw_hole_center_x_mm =
                corner_pillar_origin_xy[0]
                  + corner_pillar_square_side_length_mm / 2;
            screw_hole_center_y_mm =
                corner_pillar_origin_xy[1]
                  + corner_pillar_square_side_length_mm / 2;
            translate([screw_hole_center_x_mm,
                       screw_hole_center_y_mm,
                       -0.1])
                cylinder(h = m3_bore_top_z_mm + 0.1,
                         d = m3_screw_clearance_hole_diameter_mm);
        }

        translate([joystick_pcb_pocket_x_start_mm,
                   joystick_pcb_pocket_y_start_mm,
                   face_plate_bottom_z_mm - 0.1])
            cube([joystick_pcb_pocket_width_x_mm,
                  joystick_pcb_pocket_depth_y_mm,
                  joystick_pcb_pocket_depth_z_mm + 0.1]);

        // NOTE: the 4 blind joystick-PCB mount bores that used to sit at
        // the pocket's corners remain removed (kept consistent with the
        // v1-2mm / pico2-v2-2mm lineage). Re-add when the joystick-PCB
        // retention plan lands.
    }
}

top_cover_windowed_screen_inlay();
